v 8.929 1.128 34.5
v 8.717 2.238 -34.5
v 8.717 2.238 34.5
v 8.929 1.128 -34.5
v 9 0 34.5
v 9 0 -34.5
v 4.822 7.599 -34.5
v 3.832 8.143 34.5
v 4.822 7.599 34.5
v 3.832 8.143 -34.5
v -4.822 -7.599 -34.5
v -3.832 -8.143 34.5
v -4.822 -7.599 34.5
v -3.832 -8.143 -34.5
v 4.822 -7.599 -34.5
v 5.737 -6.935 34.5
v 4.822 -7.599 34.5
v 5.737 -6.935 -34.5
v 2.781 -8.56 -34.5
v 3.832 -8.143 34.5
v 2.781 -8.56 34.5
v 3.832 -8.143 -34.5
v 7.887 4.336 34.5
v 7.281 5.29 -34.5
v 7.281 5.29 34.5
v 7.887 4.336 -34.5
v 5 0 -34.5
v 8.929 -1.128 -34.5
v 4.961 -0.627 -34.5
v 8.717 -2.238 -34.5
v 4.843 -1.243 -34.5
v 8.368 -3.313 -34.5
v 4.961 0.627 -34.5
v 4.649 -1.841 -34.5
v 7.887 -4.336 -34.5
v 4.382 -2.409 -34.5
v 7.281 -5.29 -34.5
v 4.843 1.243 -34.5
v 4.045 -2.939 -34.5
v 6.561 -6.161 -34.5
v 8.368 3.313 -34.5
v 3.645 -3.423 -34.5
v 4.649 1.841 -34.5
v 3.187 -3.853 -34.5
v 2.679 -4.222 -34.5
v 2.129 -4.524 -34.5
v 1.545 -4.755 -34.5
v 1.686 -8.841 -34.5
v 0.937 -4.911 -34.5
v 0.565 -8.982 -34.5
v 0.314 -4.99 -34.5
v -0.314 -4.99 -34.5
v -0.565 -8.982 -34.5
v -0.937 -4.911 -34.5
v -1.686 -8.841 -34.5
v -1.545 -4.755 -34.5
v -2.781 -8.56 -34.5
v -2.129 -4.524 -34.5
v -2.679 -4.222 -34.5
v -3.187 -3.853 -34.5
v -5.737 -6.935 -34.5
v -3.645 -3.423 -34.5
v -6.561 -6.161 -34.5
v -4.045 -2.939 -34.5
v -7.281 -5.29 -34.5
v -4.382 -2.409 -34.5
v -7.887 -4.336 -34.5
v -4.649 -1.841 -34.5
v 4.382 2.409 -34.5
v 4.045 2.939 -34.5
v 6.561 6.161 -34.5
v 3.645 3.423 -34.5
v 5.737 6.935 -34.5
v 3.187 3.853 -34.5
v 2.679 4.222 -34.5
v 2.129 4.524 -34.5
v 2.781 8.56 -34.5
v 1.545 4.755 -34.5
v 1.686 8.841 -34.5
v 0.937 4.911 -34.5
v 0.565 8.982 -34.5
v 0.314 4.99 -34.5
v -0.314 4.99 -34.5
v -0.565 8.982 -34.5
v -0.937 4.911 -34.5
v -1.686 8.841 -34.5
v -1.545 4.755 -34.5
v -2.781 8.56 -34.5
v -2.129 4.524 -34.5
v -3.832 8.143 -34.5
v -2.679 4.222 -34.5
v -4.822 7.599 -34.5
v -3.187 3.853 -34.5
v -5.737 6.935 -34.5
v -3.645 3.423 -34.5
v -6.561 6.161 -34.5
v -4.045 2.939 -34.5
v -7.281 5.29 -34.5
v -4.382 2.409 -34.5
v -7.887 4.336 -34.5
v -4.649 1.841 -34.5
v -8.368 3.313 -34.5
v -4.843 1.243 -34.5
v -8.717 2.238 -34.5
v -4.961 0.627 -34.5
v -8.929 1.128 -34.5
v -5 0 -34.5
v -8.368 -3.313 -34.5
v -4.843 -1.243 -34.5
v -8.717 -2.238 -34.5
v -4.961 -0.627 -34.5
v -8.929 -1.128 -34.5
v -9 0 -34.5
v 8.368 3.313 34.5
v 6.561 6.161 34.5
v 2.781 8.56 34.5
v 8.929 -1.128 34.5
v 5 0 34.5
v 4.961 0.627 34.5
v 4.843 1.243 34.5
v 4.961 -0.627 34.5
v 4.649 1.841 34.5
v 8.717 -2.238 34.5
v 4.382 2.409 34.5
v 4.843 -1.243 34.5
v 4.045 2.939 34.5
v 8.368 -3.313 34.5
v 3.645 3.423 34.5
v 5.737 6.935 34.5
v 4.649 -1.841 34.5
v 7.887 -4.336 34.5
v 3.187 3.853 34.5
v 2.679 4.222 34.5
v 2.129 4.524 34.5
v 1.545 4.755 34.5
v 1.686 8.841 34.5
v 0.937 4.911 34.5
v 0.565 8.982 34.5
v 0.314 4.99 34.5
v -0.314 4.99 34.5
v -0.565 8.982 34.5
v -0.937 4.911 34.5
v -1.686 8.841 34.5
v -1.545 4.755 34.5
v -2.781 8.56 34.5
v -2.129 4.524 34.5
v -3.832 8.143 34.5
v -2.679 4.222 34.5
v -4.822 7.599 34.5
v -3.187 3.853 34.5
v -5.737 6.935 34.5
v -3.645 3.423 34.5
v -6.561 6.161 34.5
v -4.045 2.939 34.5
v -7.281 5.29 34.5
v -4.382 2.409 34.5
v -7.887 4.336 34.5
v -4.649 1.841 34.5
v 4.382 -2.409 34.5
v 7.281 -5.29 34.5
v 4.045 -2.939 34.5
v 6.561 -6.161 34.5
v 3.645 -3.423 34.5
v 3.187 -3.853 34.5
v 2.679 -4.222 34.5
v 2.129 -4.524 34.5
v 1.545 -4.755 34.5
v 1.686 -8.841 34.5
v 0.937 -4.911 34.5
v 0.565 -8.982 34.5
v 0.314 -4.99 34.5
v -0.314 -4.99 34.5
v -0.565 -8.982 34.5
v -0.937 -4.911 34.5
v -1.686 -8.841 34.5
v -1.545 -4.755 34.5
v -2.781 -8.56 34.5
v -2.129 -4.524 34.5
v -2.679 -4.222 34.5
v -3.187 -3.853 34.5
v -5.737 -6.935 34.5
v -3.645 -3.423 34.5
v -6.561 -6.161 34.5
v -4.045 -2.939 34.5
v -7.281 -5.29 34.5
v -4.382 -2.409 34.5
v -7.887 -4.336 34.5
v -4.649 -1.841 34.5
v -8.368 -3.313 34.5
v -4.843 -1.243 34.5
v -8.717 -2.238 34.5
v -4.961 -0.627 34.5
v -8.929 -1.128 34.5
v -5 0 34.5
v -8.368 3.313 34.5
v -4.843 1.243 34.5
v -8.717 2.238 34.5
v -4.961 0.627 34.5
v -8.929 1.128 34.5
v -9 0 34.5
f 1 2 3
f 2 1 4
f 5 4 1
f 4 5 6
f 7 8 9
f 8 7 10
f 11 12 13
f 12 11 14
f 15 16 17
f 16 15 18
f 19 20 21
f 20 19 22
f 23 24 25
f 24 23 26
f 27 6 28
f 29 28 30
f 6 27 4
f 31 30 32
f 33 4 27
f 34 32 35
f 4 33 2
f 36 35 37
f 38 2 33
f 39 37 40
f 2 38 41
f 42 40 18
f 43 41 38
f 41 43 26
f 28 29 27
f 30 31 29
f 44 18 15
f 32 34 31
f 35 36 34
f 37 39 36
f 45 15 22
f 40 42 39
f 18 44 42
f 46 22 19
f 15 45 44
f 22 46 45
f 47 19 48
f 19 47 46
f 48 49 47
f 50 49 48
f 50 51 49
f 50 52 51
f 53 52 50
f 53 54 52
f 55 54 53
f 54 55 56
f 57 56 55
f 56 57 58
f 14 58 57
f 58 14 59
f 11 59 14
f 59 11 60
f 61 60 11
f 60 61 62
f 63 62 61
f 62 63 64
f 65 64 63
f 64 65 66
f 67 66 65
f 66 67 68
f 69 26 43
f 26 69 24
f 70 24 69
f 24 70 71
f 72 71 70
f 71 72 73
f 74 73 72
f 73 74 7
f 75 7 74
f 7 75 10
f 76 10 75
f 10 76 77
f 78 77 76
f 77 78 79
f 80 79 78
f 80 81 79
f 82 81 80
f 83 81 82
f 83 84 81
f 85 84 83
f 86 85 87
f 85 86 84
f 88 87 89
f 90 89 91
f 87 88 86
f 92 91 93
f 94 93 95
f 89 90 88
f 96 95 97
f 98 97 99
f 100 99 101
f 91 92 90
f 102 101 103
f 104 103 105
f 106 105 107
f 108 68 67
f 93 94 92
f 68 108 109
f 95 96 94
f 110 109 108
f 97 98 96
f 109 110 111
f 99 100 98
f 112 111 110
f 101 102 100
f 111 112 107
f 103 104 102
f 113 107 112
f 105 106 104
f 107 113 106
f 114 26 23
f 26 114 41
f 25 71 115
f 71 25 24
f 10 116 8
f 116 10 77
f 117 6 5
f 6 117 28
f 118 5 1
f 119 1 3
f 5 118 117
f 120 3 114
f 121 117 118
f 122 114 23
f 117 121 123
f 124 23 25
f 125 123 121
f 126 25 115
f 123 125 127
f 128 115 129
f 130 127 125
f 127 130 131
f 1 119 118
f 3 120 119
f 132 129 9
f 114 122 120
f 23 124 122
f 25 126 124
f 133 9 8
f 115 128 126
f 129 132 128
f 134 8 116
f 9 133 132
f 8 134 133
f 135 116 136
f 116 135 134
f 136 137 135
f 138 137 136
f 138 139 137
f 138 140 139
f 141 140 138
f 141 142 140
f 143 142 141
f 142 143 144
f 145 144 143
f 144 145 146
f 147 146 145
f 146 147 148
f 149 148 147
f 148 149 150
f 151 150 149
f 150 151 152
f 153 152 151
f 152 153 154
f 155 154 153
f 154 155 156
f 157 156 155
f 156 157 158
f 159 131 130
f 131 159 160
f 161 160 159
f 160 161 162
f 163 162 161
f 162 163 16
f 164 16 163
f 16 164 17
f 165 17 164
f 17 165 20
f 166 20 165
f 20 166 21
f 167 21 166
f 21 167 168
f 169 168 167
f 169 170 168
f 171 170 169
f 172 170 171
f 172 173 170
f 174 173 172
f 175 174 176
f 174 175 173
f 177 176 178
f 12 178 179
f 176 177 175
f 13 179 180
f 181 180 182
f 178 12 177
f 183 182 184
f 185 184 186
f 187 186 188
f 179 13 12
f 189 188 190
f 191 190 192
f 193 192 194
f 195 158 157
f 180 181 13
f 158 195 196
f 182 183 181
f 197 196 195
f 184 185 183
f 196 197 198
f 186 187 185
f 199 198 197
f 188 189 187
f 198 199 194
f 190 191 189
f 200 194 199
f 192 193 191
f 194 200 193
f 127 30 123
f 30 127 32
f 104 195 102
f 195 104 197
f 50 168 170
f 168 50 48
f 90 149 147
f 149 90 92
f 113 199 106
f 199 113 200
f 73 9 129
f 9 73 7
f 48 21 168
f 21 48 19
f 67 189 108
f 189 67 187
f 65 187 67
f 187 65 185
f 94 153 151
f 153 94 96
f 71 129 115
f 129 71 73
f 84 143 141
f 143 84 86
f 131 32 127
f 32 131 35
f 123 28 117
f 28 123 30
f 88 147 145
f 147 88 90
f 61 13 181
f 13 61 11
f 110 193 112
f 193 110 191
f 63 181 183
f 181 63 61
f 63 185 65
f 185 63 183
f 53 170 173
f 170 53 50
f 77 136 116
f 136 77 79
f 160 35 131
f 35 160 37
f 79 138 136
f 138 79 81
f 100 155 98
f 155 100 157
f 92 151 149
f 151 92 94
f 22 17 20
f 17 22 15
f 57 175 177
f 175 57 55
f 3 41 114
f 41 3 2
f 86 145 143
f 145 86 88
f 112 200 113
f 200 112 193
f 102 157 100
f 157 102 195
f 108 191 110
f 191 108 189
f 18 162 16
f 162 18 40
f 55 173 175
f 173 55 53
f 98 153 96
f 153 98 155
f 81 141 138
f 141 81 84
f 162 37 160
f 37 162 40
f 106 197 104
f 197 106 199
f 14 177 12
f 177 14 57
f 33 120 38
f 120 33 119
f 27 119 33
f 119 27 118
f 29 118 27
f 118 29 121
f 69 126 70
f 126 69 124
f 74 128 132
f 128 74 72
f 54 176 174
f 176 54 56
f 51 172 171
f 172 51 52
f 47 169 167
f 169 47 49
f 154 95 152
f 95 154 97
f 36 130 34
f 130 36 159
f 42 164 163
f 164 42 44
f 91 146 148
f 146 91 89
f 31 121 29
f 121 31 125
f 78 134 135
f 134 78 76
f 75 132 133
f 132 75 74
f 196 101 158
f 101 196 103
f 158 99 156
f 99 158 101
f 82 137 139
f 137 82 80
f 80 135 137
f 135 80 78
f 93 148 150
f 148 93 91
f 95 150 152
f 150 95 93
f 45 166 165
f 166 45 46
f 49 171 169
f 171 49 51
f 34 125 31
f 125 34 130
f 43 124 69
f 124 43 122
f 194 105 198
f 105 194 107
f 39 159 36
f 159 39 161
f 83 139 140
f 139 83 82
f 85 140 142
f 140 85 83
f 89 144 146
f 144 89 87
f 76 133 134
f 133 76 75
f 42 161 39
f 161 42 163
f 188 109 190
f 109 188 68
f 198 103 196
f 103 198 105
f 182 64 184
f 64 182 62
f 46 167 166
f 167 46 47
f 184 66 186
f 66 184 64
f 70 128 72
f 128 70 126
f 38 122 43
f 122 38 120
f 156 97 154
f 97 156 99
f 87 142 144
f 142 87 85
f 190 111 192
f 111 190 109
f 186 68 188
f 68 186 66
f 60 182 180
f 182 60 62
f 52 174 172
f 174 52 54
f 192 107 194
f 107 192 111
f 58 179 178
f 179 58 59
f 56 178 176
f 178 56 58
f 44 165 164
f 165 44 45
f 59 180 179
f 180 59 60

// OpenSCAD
$fn = 50;


difference() {
	union() {
		translate(v = [0, 0, -34.5000000000]) {
			cylinder(h = 69, r = 9.0000000000);
		}
	}
	union() {
		translate(v = [0, 0, -100.0000000000]) {
			cylinder(h = 200, r = 5.0000000000);
		}
	}
}
